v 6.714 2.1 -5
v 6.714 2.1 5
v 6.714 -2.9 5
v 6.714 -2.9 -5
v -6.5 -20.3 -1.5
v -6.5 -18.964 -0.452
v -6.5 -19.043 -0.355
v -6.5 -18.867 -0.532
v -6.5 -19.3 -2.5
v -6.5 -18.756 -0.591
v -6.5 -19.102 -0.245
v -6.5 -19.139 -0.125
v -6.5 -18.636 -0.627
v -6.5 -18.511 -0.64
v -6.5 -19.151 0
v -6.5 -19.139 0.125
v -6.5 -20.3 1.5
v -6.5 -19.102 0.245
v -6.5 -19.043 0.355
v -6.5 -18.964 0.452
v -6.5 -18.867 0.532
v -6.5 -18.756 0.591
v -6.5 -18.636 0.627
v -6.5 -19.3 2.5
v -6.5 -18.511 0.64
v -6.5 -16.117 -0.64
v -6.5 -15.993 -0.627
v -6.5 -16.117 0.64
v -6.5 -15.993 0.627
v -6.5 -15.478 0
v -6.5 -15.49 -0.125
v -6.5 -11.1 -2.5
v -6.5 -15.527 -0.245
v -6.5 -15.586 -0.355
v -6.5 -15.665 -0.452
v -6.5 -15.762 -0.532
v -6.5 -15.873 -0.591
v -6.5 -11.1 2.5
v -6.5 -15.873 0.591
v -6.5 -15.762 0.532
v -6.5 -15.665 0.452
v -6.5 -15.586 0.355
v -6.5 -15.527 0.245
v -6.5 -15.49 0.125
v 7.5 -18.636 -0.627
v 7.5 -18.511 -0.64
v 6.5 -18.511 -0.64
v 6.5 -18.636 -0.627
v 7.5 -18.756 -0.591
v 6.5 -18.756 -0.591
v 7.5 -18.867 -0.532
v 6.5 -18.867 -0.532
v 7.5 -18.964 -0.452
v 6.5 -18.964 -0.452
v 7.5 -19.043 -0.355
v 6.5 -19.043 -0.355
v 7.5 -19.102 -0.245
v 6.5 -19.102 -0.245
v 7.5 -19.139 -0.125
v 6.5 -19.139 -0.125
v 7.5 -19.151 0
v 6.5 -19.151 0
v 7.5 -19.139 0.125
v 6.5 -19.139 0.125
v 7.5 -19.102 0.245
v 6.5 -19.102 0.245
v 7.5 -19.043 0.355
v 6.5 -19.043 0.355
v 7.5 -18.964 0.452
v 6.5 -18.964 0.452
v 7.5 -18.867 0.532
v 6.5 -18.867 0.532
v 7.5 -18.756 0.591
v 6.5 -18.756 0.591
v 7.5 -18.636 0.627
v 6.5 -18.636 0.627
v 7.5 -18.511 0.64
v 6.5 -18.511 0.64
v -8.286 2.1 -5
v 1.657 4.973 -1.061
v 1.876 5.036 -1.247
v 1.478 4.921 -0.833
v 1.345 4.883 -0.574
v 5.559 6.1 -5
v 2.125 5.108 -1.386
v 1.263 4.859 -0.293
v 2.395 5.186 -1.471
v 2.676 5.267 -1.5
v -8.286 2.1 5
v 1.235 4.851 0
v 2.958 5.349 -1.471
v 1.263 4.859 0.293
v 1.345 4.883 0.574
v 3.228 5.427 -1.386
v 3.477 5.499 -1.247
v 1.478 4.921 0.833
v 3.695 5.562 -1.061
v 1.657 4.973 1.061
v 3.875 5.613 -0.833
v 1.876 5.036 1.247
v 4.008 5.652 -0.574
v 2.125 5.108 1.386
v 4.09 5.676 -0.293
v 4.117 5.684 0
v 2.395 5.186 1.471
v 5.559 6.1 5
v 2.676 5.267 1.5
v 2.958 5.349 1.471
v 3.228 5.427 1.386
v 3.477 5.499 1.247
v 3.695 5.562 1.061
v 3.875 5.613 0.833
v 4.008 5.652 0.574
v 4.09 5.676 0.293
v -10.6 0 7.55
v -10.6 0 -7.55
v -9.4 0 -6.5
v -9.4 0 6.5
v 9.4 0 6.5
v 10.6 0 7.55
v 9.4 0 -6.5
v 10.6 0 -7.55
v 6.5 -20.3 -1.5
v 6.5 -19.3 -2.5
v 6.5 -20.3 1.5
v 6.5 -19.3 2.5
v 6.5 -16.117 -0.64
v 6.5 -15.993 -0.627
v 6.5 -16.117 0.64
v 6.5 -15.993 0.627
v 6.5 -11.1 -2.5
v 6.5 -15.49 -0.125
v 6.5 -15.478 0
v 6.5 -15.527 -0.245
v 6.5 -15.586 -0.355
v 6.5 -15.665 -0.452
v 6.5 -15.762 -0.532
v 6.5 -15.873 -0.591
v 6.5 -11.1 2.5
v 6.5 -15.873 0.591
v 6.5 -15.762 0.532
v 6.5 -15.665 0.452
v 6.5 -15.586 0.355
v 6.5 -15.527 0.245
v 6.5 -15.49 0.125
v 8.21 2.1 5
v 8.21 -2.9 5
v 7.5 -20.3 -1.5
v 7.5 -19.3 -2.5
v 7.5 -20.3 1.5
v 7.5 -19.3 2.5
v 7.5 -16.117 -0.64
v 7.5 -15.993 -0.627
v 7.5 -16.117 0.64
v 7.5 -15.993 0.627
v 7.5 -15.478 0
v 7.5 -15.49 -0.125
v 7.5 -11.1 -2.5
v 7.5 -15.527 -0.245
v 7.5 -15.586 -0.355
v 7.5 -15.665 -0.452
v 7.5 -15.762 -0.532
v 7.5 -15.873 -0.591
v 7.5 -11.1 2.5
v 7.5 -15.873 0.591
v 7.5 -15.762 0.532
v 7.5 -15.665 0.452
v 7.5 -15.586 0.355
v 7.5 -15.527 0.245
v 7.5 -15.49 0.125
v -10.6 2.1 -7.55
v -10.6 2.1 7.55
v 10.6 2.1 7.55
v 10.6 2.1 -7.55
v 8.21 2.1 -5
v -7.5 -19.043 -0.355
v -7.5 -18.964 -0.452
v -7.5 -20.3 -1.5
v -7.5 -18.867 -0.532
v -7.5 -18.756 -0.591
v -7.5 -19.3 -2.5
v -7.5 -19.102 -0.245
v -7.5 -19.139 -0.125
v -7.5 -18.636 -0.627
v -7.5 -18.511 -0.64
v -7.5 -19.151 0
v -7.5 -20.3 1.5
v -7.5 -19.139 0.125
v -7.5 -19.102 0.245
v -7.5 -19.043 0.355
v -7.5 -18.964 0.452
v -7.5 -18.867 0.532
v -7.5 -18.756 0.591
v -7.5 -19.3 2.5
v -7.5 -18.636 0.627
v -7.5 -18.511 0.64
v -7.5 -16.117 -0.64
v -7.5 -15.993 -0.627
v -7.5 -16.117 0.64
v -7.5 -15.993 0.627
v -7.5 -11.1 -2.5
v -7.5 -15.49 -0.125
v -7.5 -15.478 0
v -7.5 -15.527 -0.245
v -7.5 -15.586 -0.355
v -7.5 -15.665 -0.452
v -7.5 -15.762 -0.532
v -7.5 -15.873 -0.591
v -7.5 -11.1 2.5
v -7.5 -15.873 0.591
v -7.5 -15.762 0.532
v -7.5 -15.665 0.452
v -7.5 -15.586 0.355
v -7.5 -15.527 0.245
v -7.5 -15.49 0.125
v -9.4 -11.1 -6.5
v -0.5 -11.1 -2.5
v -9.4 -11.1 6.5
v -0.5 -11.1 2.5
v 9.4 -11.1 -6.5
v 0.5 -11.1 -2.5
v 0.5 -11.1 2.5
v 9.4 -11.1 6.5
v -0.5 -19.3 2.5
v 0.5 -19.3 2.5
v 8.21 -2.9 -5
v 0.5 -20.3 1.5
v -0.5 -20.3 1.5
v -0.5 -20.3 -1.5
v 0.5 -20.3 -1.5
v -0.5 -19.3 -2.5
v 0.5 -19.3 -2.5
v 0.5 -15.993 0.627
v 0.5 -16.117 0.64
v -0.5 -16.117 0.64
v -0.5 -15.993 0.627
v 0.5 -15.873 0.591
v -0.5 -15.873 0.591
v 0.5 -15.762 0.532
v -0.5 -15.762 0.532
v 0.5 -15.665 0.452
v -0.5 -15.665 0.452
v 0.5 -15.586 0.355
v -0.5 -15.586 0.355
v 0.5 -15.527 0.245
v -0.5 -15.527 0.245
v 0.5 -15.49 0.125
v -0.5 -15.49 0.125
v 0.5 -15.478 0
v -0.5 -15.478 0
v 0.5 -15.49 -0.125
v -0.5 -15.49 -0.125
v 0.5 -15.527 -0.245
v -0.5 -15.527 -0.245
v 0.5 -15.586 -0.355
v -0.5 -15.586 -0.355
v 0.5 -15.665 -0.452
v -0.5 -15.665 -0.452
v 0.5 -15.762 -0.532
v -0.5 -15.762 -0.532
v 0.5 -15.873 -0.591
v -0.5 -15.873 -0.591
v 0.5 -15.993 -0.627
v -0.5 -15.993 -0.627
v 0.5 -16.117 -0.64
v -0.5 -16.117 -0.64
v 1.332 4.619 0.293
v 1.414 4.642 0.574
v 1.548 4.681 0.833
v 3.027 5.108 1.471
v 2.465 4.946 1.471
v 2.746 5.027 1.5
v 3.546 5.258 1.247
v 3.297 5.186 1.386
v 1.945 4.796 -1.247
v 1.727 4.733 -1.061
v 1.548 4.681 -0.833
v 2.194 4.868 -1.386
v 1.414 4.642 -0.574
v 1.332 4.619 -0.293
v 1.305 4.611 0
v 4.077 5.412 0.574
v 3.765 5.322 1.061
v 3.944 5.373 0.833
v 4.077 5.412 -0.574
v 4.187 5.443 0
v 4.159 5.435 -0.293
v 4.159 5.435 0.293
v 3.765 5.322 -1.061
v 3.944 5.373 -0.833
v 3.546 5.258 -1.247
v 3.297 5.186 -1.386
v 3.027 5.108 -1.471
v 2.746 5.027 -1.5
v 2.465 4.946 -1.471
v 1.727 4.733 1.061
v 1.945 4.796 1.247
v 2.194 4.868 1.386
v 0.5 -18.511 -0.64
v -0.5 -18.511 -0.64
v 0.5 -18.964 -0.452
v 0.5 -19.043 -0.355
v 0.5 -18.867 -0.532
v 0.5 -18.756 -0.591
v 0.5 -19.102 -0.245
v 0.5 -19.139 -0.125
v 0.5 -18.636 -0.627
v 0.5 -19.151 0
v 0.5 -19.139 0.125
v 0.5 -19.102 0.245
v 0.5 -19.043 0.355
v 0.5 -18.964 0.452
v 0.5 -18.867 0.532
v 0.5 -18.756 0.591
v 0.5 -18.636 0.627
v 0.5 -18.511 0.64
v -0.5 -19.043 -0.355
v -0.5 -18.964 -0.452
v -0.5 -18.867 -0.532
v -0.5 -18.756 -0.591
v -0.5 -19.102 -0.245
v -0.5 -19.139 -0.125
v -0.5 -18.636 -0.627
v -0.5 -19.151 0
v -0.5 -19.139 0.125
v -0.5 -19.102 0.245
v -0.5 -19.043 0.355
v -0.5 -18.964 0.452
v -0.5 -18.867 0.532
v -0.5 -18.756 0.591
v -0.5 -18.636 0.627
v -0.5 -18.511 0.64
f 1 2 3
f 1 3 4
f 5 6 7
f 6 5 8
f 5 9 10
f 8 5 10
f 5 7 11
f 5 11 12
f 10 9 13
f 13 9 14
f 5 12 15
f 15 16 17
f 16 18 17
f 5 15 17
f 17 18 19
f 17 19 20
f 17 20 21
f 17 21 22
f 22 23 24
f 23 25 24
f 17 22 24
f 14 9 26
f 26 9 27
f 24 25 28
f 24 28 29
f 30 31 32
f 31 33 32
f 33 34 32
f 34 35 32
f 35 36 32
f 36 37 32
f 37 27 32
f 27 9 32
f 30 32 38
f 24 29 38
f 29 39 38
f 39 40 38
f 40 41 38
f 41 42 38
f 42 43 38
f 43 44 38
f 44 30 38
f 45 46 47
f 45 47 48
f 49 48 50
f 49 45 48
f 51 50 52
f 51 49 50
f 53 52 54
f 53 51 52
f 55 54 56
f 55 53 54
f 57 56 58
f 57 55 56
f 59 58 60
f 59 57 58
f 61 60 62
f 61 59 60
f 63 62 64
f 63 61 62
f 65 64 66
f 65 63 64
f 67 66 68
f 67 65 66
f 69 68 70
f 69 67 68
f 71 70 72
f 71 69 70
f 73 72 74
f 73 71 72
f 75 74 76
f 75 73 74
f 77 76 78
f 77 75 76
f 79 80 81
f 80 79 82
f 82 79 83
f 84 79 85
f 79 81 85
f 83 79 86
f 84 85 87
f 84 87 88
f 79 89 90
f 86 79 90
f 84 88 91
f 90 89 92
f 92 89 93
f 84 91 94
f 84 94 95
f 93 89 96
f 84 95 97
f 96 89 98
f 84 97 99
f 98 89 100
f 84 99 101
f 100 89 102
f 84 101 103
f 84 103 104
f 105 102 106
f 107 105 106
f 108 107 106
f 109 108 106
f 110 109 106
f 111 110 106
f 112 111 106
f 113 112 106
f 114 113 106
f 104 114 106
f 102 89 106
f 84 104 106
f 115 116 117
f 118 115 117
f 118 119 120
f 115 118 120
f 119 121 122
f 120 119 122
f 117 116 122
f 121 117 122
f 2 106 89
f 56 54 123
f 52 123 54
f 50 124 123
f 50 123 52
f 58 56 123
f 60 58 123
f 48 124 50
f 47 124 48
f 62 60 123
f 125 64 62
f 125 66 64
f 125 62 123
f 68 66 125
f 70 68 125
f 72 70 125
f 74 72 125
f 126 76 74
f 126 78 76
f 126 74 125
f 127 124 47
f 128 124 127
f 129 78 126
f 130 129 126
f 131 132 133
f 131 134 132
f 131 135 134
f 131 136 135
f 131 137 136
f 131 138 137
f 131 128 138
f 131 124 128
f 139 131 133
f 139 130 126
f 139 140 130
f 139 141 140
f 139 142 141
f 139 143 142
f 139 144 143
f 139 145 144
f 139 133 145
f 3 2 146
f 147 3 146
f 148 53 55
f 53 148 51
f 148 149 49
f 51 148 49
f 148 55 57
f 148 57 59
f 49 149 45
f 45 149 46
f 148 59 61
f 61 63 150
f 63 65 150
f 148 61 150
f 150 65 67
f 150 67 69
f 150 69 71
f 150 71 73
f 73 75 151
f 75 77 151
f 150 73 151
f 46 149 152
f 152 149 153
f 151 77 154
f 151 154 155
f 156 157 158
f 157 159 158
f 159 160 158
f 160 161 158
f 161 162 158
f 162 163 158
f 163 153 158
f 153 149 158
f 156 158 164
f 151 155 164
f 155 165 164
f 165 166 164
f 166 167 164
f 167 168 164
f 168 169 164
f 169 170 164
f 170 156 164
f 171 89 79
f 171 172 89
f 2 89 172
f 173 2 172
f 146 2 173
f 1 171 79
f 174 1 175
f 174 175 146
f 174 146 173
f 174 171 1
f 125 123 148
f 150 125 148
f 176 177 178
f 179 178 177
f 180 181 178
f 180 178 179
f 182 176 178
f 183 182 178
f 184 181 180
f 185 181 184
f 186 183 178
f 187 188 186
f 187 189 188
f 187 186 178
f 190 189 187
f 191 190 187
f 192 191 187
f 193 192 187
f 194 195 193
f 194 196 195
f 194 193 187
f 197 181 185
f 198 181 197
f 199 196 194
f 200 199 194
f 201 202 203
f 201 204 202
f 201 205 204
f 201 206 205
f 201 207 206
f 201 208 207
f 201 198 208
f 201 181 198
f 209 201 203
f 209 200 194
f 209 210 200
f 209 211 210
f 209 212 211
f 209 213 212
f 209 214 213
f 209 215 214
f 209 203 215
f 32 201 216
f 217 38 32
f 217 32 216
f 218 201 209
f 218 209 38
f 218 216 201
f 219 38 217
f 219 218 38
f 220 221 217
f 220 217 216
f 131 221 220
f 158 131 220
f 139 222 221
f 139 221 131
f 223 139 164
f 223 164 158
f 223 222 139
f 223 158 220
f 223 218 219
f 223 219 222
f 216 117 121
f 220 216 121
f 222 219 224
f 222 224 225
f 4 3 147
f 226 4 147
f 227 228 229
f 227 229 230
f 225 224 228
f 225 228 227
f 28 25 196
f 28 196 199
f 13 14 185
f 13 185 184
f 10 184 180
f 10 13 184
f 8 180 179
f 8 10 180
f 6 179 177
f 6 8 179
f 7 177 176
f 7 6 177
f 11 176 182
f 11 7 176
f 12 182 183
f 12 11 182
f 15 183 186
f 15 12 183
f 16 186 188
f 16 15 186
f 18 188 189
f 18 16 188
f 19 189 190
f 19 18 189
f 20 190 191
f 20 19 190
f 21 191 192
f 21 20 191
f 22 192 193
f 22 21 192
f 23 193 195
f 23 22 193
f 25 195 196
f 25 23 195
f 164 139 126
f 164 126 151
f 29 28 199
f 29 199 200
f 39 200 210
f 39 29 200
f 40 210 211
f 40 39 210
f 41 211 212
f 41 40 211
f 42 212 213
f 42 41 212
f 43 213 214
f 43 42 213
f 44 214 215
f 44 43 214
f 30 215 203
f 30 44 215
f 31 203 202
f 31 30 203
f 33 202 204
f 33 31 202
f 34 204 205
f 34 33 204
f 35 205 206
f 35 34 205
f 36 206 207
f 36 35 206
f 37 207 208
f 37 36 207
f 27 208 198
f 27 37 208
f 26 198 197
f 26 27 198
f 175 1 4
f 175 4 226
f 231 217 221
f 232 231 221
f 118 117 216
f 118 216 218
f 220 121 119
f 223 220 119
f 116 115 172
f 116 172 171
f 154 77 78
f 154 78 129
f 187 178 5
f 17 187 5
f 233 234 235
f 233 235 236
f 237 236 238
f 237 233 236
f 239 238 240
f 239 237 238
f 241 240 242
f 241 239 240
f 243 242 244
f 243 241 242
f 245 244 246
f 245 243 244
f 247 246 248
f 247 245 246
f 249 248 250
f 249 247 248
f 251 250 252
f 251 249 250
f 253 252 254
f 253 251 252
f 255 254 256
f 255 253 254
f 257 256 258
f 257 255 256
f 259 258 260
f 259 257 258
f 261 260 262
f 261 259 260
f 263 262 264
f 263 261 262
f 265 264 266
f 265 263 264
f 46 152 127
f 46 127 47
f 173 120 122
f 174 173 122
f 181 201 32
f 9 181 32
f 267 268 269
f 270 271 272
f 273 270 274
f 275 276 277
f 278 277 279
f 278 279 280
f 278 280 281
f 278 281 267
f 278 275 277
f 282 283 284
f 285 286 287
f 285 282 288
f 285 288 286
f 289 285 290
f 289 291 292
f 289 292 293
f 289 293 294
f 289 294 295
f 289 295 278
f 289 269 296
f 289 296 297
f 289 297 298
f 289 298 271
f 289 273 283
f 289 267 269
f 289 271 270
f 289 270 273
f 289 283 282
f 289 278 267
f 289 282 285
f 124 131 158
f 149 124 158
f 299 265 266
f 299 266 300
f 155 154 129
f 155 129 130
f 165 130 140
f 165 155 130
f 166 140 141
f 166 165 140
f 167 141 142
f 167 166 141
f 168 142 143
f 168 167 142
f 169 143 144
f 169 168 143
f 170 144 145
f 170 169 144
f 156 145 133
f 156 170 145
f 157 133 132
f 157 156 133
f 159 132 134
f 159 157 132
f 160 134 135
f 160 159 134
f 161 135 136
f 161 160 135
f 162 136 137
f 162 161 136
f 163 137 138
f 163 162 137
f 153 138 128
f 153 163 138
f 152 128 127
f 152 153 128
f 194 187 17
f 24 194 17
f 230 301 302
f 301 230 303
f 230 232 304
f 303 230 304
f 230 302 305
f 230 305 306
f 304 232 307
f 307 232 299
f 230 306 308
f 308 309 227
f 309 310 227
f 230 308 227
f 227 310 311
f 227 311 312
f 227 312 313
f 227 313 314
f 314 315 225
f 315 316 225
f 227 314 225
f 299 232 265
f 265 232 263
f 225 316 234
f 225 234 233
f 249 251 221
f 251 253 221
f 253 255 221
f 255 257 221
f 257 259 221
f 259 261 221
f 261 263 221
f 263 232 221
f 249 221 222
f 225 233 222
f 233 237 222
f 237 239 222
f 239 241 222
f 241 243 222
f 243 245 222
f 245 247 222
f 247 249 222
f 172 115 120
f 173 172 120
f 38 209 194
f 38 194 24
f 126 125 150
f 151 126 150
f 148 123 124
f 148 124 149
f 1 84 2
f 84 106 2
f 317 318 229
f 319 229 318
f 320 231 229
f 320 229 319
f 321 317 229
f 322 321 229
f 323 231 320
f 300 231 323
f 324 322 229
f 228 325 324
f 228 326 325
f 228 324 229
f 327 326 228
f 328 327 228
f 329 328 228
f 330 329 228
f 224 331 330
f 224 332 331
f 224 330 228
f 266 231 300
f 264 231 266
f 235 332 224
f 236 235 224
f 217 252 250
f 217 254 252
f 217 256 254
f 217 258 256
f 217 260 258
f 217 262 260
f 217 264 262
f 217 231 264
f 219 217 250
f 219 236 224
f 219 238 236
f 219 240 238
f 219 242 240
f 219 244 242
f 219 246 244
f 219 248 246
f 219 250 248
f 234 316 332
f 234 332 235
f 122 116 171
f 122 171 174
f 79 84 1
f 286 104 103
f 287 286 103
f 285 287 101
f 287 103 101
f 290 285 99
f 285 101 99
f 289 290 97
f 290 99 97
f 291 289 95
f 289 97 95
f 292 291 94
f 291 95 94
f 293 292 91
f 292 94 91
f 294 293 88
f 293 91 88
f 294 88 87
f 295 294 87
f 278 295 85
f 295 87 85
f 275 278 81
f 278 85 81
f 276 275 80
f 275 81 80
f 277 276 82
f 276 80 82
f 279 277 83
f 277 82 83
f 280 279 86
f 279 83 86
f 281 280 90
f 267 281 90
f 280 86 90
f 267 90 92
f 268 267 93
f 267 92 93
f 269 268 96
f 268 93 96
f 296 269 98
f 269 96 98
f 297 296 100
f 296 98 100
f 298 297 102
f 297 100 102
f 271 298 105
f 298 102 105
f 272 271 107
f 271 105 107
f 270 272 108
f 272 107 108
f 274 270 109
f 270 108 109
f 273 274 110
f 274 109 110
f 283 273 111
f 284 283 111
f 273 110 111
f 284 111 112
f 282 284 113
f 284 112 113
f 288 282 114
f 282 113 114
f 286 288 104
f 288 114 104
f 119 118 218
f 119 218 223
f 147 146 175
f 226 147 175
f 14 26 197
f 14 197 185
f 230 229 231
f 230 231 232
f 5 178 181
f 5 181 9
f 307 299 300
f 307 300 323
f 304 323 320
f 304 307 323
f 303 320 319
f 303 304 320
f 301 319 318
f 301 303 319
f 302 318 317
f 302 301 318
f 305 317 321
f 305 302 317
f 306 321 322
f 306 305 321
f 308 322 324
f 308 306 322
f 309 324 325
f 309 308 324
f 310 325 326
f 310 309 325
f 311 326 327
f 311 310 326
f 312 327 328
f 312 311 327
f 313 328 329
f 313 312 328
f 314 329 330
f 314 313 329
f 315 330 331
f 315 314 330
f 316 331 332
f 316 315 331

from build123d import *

# Parameters (mm, degrees)
SKETCH1_W                  = 21.2
SKETCH1_H                  = 15.1
BOSS_EXTRUDE1_DEPTH        = 2.1
SKETCH2_W                  = 18.8
SKETCH2_H                  = 13
BOSS_EXTRUDE2_DEPTH        = 11.1
BOSS_EXTRUDE3_DEPTH        = 5
BOSS_EXTRUDE3_DEPTH_BACK   = 5
SKETCH14_W                 = 1.495775322
SKETCH14_H                 = 10
CUT_EXTRUDE1_DEPTH         = 5
SKETCH15_R                 = 1.5
CUT_EXTRUDE2_DEPTH         = 0.25
SKETCH16_W                 = 1
SKETCH16_H                 = 5
BOSS_EXTRUDE4_DEPTH        = 9.2
CUT_EXTRUDE3_DEPTH         = 1
CHAMFER1_SIZE              = 1
LPATTERN1_COUNT            = 2
LPATTERN1_PITCH            = 7
LPATTERN1_COUNT_DIR2       = 2
LPATTERN1_PITCH_DIR2       = 7
CHAMFER1_OF_LPATTERN1_SIZE = 1


with BuildPart() as part:
    # Sketch1 → Boss-Extrude1 (new body)
    with BuildSketch(Plane(origin=(0, 0, 0), x_dir=(1, 0, 0), z_dir=(0, 1, 0))):
        Rectangle(SKETCH1_W, SKETCH1_H)
    extrude(amount=BOSS_EXTRUDE1_DEPTH)

    # Sketch2 → Boss-Extrude2 (add)
    with BuildSketch(Plane.XZ):
        Rectangle(SKETCH2_W, SKETCH2_H)
    extrude(amount=BOSS_EXTRUDE2_DEPTH)

    # Sketch12 → Boss-Extrude3 (add, two sides)
    with BuildSketch(Plane.XY) as boss_extrude3_sk:
        Polygon((-8.285775322, 2.1), (5.558513448, 6.1), (6.714224678, 2.1), align=None)
    extrude(amount=BOSS_EXTRUDE3_DEPTH)
    extrude(boss_extrude3_sk.sketch, amount=-BOSS_EXTRUDE3_DEPTH_BACK)

    # Sketch14 → Cut-Extrude1 (cut)
    with BuildSketch(Plane(origin=(0, 2.1, 0), x_dir=(1, 0, 0), z_dir=(0, 1, 0))):
        with Locations((7.462112339, 0)):
            Rectangle(SKETCH14_W, SKETCH14_H)
    extrude(amount=-CUT_EXTRUDE1_DEPTH, mode=Mode.SUBTRACT)

    # Sketch15 → Cut-Extrude2 (cut)
    with BuildSketch(Plane(origin=(-1.198397572, 4.147740514, 0), x_dir=(0.960704213, 0.277574162, 0), z_dir=(-0.277574162, 0.960704213, 0))):
        with Locations((4.033289675, 0)):
            Circle(SKETCH15_R)
    extrude(amount=-CUT_EXTRUDE2_DEPTH, mode=Mode.SUBTRACT)

    # Sketch16 → Boss-Extrude4 (add)
    with BuildSketch(Plane.XZ.offset(11.1)):
        Rectangle(SKETCH16_W, SKETCH16_H)
    boss_extrude4 = extrude(amount=BOSS_EXTRUDE4_DEPTH)

    # Sketch17 → Cut-Extrude3 (cut)
    with BuildSketch(Plane(origin=(0.5, 0, 0), x_dir=(0, 0, -1), z_dir=(1, 0, 0))):
        with BuildLine():
            Line((-0.639644883, -18.511467052), (-0.639644883, -16.117458369))
            ThreePointArc((-0.639644883, -16.117458369), (0, -15.477813486), (0.639644883, -16.117458369))
            Line((0.639644883, -16.117458369), (0.639644883, -18.511467052))
            ThreePointArc((0.639644883, -18.511467052), (0, -19.151111935), (-0.639644883, -18.511467052))
        make_face()
    cut_extrude3 = extrude(amount=-CUT_EXTRUDE3_DEPTH, mode=Mode.SUBTRACT)

    # Chamfer1
    chamfer1_edges = [part.edges().sort_by_distance(p)[0] for p in [
        (0, -20.3, 2.5),
        (0, -20.3, -2.5),
    ]]
    chamfer(chamfer1_edges, length=CHAMFER1_SIZE)

    # LPattern1: Boss-Extrude4, Cut-Extrude3 2 × 2
    with Locations(*[Vector(1, 0, 0) * (i * LPATTERN1_PITCH) + Vector(-1, 0, 0) * (j * LPATTERN1_PITCH_DIR2) for i in range(LPATTERN1_COUNT) for j in range(LPATTERN1_COUNT_DIR2) if (i, j) != (0, 0)]):
        add(boss_extrude4)
        add(cut_extrude3, mode=Mode.SUBTRACT)

    # Chamfer1 of LPattern1
    chamfer1_of_lpattern1_edges = [part.edges().sort_by_distance(p)[0] for p in [
        (-7, -20.3, 2.5),
        (-7, -20.3, -2.5),
        (7, -20.3, 2.5),
        (7, -20.3, -2.5),
        (0, -20.3, 2.5),
        (0, -20.3, -2.5),
    ]]
    chamfer(chamfer1_of_lpattern1_edges, length=CHAMFER1_OF_LPATTERN1_SIZE)


solid = part.part
